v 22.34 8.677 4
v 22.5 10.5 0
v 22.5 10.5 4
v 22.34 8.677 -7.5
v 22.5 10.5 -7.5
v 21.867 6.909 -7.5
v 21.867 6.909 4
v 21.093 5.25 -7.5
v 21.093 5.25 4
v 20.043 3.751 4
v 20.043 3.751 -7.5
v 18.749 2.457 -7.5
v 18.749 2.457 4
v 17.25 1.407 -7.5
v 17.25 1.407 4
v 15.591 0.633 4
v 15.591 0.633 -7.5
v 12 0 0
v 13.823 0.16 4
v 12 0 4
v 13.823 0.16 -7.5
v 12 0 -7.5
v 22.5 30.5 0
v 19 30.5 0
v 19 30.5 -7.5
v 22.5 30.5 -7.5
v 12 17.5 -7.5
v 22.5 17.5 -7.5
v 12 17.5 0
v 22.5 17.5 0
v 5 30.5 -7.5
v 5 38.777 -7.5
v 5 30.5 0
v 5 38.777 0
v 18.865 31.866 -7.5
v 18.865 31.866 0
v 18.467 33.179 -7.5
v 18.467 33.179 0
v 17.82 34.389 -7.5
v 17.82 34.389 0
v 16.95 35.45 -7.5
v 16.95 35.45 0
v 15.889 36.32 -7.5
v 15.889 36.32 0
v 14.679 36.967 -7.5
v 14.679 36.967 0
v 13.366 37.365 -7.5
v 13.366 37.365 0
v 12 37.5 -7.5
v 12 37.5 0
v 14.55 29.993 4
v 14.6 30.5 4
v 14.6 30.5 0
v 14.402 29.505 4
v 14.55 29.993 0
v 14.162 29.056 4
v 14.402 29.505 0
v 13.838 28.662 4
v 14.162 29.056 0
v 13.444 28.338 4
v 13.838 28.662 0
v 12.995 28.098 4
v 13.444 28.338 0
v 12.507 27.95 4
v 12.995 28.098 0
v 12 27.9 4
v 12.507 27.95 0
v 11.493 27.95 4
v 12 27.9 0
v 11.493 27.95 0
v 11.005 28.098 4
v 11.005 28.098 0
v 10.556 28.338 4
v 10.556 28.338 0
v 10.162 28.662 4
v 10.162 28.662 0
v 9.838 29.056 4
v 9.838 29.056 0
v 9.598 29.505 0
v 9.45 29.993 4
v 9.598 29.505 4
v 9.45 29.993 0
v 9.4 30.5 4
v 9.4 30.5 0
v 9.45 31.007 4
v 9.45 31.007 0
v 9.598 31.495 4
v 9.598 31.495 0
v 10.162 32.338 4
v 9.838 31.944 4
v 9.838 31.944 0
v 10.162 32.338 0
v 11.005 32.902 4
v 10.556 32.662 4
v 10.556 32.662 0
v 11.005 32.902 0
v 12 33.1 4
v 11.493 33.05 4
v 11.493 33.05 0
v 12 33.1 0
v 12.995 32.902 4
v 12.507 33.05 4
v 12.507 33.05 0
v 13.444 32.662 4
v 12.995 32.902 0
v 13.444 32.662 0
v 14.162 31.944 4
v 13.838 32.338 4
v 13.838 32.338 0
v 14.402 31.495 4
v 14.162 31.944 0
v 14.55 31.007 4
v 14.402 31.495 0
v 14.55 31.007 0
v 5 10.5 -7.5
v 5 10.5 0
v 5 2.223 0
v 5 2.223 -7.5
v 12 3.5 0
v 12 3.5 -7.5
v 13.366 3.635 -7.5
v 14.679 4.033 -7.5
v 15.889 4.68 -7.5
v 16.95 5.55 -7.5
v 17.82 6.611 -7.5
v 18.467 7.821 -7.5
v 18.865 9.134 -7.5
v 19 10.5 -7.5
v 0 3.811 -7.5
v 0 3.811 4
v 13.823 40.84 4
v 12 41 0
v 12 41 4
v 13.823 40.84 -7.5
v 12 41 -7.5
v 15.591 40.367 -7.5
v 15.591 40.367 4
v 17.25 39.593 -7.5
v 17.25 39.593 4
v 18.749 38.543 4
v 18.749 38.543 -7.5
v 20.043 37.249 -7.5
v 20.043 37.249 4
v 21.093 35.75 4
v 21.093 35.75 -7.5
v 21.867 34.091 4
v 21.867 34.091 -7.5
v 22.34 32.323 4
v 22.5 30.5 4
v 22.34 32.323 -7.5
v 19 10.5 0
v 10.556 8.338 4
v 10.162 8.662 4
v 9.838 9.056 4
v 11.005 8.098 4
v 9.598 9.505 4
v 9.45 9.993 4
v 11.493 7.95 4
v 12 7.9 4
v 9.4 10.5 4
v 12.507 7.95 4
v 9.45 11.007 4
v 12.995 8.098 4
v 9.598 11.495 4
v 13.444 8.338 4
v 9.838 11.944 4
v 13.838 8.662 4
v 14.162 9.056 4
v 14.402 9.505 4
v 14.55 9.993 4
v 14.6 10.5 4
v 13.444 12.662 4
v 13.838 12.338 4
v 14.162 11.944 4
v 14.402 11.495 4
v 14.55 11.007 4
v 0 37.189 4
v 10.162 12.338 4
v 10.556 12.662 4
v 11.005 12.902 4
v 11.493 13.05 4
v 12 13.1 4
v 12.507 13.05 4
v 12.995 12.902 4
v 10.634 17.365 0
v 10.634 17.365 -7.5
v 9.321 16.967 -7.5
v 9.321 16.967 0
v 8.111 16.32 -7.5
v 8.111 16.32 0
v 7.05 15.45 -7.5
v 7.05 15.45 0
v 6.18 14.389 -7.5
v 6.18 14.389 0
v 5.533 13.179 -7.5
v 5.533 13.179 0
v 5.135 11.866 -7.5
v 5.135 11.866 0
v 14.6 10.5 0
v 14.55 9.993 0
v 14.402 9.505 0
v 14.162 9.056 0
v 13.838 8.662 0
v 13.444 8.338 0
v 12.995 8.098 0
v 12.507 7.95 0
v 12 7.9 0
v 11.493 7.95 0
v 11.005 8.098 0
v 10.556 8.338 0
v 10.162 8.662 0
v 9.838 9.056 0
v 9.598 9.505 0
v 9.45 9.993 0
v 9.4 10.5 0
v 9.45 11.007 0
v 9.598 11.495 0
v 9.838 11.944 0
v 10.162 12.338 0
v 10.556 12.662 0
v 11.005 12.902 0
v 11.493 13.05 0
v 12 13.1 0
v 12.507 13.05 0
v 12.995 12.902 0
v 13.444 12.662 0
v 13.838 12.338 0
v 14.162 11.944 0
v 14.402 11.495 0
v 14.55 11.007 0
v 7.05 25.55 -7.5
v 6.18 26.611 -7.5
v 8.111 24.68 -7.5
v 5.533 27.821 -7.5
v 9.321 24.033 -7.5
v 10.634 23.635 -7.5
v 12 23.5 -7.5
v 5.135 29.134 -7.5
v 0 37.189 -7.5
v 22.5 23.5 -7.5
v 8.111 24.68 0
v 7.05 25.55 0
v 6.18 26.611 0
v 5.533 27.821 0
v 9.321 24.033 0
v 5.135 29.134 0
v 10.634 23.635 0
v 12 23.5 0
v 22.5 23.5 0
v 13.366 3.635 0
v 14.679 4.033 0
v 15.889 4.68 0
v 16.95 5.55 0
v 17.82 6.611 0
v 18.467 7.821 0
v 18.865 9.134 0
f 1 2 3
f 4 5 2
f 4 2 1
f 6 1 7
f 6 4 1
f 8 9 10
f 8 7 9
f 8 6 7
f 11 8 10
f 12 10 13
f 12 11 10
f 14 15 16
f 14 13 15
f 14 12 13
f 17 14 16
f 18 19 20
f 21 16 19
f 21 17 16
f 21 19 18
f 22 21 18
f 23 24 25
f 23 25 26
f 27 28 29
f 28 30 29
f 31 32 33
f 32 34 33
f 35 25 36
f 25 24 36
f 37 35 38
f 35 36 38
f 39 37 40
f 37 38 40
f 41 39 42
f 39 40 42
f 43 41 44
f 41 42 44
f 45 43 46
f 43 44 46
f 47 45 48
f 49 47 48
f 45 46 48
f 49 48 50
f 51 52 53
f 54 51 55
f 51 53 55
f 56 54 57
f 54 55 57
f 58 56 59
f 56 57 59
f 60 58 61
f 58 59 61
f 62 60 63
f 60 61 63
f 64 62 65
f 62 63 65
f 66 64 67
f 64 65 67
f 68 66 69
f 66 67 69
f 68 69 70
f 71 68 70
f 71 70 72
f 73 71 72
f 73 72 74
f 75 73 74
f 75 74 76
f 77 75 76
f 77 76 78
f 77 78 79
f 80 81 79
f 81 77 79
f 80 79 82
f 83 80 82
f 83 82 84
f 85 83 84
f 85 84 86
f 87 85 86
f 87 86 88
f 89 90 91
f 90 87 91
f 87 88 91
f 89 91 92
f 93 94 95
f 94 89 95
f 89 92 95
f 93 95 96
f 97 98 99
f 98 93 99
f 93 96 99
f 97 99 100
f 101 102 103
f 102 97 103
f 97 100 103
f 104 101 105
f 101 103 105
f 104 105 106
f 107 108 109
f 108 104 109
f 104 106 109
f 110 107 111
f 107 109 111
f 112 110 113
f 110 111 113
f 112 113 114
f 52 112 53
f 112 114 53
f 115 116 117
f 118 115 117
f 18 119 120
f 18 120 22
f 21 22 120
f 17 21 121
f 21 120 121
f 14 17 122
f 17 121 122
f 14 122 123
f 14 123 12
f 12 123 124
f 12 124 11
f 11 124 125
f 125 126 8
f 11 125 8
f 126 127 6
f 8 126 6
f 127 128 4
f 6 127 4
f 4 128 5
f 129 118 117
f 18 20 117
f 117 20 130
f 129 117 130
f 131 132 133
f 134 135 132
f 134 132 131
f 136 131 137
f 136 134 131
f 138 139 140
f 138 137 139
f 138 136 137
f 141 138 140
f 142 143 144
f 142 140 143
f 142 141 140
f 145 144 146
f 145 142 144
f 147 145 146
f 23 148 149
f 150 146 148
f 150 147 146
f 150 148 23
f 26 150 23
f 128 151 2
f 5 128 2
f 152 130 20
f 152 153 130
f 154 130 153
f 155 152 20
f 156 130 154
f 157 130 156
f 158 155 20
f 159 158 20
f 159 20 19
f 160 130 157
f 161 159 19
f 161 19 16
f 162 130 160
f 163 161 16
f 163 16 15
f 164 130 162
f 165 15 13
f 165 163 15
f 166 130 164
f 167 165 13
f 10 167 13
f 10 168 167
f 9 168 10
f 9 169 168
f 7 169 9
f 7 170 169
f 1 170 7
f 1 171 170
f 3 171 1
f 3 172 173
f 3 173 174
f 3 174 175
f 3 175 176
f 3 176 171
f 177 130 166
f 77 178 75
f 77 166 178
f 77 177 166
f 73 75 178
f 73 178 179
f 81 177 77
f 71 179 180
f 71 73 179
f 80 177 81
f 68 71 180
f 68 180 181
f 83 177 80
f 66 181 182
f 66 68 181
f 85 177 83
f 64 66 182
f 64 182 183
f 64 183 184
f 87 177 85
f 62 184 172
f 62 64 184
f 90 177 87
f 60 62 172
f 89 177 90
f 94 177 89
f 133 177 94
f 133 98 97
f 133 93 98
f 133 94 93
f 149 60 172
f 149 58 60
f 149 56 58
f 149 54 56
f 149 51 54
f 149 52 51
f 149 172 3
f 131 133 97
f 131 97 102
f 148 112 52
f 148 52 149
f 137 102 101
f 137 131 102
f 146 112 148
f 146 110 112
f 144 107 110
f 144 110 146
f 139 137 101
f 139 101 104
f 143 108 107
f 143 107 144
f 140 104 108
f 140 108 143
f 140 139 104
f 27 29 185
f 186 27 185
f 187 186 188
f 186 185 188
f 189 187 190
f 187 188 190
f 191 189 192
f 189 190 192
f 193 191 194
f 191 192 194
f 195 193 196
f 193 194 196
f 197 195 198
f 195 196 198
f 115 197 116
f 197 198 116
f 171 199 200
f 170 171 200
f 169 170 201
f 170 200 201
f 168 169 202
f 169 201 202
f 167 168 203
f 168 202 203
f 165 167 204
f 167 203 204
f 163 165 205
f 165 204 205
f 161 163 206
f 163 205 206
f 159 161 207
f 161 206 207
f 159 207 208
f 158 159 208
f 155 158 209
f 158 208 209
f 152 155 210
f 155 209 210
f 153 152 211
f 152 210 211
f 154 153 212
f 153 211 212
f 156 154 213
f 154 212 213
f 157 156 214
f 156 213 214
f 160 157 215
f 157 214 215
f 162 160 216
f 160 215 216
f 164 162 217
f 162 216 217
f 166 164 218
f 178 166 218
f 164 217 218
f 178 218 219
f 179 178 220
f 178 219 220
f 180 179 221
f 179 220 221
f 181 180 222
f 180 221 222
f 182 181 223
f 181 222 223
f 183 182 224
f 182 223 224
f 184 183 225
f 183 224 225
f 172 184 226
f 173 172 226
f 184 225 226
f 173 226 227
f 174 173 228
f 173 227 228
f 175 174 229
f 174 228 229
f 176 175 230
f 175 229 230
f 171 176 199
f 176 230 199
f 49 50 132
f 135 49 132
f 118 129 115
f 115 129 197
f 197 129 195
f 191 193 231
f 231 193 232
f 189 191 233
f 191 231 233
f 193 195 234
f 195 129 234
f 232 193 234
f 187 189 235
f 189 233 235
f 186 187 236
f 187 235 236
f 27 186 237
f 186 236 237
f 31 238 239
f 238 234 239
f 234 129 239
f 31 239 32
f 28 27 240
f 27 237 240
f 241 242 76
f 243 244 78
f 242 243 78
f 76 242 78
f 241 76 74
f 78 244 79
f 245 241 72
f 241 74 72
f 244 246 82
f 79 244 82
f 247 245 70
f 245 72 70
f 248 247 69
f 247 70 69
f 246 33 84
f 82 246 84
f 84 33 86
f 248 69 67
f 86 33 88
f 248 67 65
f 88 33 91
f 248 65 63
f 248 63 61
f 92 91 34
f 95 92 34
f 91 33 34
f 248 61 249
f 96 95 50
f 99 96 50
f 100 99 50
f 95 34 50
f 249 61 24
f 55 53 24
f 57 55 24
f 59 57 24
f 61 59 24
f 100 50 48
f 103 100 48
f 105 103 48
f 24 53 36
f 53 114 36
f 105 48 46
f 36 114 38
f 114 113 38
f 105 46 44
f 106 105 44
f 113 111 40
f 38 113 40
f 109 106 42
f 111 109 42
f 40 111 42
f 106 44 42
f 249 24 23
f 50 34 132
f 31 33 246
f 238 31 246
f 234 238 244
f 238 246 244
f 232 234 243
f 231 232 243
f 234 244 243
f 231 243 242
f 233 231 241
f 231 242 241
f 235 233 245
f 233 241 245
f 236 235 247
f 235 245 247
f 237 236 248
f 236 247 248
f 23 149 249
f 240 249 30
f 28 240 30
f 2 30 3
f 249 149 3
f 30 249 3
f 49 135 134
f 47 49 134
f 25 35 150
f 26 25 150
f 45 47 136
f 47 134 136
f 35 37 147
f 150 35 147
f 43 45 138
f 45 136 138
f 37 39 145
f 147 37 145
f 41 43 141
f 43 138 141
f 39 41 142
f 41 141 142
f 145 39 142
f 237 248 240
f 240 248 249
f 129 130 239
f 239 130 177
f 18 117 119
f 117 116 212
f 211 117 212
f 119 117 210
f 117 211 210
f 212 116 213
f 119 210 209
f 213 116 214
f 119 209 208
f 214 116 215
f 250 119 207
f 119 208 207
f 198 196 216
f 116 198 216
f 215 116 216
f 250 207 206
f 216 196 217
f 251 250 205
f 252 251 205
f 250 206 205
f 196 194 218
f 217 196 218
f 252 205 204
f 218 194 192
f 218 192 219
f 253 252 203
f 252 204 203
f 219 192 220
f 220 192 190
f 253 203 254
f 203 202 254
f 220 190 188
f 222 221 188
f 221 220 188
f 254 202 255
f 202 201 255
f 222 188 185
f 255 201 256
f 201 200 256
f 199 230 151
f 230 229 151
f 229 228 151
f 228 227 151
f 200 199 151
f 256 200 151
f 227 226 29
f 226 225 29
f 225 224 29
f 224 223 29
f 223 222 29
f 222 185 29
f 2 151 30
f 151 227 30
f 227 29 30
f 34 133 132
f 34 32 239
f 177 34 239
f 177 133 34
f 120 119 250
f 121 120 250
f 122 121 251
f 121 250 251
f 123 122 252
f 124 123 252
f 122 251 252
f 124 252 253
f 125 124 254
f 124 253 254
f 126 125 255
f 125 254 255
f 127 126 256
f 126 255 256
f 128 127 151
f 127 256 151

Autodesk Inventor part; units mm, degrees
ref_plane "YZ Plane" through (0, 0, 0) normal (1, 0, 0) x (0, 1, 0)
ref_plane "XZ Plane" through (0, 0, 0) normal (0, 1, 0) x (-1, 0, 0)
ref_plane "XY Plane" through (0, 0, 0) normal (0, 0, 1) x (1, 0, 0)
sketch "Sketch1" plane through (0, 0, 0) normal (0, 0, 1) x (1, 0, 0)
  circle A0 centre (12, 30.5) radius 7
  circle A1 centre (12, 10.5) radius 7
  line L0 (5, 23.5) -> (22.5, 23.5)
  line L1 (22.5, 23.5) -> (22.5, 17.5)
  line L2 (22.5, 17.5) -> (5, 17.5)
  line L3 (5, 17.5) -> (5, 23.5)
  line L4 (0, 41) -> (5, 41)
  line L5 (5, 41) -> (5, 0)
  line L6 (5, 0) -> (0, 0)
  line L7 (0, 0) -> (0, 41)
  circle A2 centre (12, 10.5) radius 2.6
  circle A3 centre (12, 30.5) radius 2.6
  circle A4 centre (12, 30.5) radius 10.5
  circle A5 centre (12, 10.5) radius 10.5
  line L8 (5, 41) -> (12, 41)
  line L9 (22.5, 23.5) -> (22.5, 30.5)
  line L10 (22.5, 17.5) -> (22.5, 10.5)
  line L11 (5, 0) -> (12, 0)
  line L12 (12, 10.5) -> (12, 0)
  line L13 (12, 10.5) -> (22.5, 10.5)
  line L14 (12, 30.5) -> (12, 41)
  line L15 (12, 30.5) -> (22.5, 30.5)
  point P0 (5, 17.5)
  point P1 (5, 23.5)
  point P2 (5, 10.5)
  point P3 (12, 17.5)
  point P4 (5, 30.5)
  point P5 (12, 23.5)
  point P6 (19, 10.5)
  point P7 (12, 3.5)
  point P8 (19, 30.5)
  point P9 (12, 37.5)
  dimension "d0" = 20
  dimension "d1" = 14
  dimension "d2" = 5.2
  dimension "d3" = 5.2
  dimension "d6" = 3.5
  dimension "d13" = 5
extrude "Extrusion1" add sketch "Sketch1" against normal blind 7.5 contours A0 L14 A4 L15 | L0 L5 A0 | L0 A4 A5 L3 | L5 L3 A4 | L0 L1 L2 A5 A4 | A4 L3 A5 L5 L6 L7 L4 | A4 A5 L3 | A5 L2 L3 A4 | A4 A5 | L3 L5 A5 | A5 L12 A1 L13 | L2 A1 L5
extrude "Extrusion2" add sketch "Sketch1" along normal blind 4 contours L15 A3 L14 A0 | L15 A4 L0 A0 | A0 L14 A3 L15 | A0 L14 A4 L15 | A0 L5 A4 L14 | L0 L5 A0 | L0 A4 A5 L3 | L9 L0 A4 | L5 L3 A4 | A4 L5 L8 | L0 L1 L2 A5 A4 | A4 L3 A5 L5 L6 L7 L4 | A4 A5 L3 | A5 L2 L3 A4 | A4 A5 | L10 A5 L2 | L3 L5 A5 | A5 L13 A1 L2 | A5 L12 A1 L13 | L2 A1 L5 | A5 L11 L5 | L5 A1 L12 A5 | A1 L13 A2 L12 | A1 L12 A2 L13
sketch "Sketch2" plane through (0, 0, 4) normal (0, 0, 1) x (1, 0, 0)
  line L0 (12, 41) -> (0, 41) projected
  line L1 (0, 41) -> (0, 0) projected
  line L2 (0, 0) -> (12, 0) projected
  arc A0 (12, 0) -> (22.5, 10.5) centre (12, 10.5) ccw projected
  line L3 (22.5, 10.5) -> (22.5, 30.5) projected
  arc A1 (22.5, 30.5) -> (12, 41) centre (12, 30.5) ccw projected
  circle A2 centre (12, 10.5) radius 2.6 projected
  circle A3 centre (12, 30.5) radius 2.6 projected
  arc A4 (22.5, 30.5) -> (12, 41) centre (12, 30.5) ccw projected
  line L4 (12, 41) -> (0, 37.1888)
  line L5 (5, 0) -> (12, 0) projected
  line L6 (12, 0) -> (0, 3.8112)
  dimension "d14" = 17.62
extrude "Extrusion3" cut sketch "Sketch2" against normal through all contours L4 L1 L0 | L6 L2 L1
properties part number "XZ Bearing Cage"
